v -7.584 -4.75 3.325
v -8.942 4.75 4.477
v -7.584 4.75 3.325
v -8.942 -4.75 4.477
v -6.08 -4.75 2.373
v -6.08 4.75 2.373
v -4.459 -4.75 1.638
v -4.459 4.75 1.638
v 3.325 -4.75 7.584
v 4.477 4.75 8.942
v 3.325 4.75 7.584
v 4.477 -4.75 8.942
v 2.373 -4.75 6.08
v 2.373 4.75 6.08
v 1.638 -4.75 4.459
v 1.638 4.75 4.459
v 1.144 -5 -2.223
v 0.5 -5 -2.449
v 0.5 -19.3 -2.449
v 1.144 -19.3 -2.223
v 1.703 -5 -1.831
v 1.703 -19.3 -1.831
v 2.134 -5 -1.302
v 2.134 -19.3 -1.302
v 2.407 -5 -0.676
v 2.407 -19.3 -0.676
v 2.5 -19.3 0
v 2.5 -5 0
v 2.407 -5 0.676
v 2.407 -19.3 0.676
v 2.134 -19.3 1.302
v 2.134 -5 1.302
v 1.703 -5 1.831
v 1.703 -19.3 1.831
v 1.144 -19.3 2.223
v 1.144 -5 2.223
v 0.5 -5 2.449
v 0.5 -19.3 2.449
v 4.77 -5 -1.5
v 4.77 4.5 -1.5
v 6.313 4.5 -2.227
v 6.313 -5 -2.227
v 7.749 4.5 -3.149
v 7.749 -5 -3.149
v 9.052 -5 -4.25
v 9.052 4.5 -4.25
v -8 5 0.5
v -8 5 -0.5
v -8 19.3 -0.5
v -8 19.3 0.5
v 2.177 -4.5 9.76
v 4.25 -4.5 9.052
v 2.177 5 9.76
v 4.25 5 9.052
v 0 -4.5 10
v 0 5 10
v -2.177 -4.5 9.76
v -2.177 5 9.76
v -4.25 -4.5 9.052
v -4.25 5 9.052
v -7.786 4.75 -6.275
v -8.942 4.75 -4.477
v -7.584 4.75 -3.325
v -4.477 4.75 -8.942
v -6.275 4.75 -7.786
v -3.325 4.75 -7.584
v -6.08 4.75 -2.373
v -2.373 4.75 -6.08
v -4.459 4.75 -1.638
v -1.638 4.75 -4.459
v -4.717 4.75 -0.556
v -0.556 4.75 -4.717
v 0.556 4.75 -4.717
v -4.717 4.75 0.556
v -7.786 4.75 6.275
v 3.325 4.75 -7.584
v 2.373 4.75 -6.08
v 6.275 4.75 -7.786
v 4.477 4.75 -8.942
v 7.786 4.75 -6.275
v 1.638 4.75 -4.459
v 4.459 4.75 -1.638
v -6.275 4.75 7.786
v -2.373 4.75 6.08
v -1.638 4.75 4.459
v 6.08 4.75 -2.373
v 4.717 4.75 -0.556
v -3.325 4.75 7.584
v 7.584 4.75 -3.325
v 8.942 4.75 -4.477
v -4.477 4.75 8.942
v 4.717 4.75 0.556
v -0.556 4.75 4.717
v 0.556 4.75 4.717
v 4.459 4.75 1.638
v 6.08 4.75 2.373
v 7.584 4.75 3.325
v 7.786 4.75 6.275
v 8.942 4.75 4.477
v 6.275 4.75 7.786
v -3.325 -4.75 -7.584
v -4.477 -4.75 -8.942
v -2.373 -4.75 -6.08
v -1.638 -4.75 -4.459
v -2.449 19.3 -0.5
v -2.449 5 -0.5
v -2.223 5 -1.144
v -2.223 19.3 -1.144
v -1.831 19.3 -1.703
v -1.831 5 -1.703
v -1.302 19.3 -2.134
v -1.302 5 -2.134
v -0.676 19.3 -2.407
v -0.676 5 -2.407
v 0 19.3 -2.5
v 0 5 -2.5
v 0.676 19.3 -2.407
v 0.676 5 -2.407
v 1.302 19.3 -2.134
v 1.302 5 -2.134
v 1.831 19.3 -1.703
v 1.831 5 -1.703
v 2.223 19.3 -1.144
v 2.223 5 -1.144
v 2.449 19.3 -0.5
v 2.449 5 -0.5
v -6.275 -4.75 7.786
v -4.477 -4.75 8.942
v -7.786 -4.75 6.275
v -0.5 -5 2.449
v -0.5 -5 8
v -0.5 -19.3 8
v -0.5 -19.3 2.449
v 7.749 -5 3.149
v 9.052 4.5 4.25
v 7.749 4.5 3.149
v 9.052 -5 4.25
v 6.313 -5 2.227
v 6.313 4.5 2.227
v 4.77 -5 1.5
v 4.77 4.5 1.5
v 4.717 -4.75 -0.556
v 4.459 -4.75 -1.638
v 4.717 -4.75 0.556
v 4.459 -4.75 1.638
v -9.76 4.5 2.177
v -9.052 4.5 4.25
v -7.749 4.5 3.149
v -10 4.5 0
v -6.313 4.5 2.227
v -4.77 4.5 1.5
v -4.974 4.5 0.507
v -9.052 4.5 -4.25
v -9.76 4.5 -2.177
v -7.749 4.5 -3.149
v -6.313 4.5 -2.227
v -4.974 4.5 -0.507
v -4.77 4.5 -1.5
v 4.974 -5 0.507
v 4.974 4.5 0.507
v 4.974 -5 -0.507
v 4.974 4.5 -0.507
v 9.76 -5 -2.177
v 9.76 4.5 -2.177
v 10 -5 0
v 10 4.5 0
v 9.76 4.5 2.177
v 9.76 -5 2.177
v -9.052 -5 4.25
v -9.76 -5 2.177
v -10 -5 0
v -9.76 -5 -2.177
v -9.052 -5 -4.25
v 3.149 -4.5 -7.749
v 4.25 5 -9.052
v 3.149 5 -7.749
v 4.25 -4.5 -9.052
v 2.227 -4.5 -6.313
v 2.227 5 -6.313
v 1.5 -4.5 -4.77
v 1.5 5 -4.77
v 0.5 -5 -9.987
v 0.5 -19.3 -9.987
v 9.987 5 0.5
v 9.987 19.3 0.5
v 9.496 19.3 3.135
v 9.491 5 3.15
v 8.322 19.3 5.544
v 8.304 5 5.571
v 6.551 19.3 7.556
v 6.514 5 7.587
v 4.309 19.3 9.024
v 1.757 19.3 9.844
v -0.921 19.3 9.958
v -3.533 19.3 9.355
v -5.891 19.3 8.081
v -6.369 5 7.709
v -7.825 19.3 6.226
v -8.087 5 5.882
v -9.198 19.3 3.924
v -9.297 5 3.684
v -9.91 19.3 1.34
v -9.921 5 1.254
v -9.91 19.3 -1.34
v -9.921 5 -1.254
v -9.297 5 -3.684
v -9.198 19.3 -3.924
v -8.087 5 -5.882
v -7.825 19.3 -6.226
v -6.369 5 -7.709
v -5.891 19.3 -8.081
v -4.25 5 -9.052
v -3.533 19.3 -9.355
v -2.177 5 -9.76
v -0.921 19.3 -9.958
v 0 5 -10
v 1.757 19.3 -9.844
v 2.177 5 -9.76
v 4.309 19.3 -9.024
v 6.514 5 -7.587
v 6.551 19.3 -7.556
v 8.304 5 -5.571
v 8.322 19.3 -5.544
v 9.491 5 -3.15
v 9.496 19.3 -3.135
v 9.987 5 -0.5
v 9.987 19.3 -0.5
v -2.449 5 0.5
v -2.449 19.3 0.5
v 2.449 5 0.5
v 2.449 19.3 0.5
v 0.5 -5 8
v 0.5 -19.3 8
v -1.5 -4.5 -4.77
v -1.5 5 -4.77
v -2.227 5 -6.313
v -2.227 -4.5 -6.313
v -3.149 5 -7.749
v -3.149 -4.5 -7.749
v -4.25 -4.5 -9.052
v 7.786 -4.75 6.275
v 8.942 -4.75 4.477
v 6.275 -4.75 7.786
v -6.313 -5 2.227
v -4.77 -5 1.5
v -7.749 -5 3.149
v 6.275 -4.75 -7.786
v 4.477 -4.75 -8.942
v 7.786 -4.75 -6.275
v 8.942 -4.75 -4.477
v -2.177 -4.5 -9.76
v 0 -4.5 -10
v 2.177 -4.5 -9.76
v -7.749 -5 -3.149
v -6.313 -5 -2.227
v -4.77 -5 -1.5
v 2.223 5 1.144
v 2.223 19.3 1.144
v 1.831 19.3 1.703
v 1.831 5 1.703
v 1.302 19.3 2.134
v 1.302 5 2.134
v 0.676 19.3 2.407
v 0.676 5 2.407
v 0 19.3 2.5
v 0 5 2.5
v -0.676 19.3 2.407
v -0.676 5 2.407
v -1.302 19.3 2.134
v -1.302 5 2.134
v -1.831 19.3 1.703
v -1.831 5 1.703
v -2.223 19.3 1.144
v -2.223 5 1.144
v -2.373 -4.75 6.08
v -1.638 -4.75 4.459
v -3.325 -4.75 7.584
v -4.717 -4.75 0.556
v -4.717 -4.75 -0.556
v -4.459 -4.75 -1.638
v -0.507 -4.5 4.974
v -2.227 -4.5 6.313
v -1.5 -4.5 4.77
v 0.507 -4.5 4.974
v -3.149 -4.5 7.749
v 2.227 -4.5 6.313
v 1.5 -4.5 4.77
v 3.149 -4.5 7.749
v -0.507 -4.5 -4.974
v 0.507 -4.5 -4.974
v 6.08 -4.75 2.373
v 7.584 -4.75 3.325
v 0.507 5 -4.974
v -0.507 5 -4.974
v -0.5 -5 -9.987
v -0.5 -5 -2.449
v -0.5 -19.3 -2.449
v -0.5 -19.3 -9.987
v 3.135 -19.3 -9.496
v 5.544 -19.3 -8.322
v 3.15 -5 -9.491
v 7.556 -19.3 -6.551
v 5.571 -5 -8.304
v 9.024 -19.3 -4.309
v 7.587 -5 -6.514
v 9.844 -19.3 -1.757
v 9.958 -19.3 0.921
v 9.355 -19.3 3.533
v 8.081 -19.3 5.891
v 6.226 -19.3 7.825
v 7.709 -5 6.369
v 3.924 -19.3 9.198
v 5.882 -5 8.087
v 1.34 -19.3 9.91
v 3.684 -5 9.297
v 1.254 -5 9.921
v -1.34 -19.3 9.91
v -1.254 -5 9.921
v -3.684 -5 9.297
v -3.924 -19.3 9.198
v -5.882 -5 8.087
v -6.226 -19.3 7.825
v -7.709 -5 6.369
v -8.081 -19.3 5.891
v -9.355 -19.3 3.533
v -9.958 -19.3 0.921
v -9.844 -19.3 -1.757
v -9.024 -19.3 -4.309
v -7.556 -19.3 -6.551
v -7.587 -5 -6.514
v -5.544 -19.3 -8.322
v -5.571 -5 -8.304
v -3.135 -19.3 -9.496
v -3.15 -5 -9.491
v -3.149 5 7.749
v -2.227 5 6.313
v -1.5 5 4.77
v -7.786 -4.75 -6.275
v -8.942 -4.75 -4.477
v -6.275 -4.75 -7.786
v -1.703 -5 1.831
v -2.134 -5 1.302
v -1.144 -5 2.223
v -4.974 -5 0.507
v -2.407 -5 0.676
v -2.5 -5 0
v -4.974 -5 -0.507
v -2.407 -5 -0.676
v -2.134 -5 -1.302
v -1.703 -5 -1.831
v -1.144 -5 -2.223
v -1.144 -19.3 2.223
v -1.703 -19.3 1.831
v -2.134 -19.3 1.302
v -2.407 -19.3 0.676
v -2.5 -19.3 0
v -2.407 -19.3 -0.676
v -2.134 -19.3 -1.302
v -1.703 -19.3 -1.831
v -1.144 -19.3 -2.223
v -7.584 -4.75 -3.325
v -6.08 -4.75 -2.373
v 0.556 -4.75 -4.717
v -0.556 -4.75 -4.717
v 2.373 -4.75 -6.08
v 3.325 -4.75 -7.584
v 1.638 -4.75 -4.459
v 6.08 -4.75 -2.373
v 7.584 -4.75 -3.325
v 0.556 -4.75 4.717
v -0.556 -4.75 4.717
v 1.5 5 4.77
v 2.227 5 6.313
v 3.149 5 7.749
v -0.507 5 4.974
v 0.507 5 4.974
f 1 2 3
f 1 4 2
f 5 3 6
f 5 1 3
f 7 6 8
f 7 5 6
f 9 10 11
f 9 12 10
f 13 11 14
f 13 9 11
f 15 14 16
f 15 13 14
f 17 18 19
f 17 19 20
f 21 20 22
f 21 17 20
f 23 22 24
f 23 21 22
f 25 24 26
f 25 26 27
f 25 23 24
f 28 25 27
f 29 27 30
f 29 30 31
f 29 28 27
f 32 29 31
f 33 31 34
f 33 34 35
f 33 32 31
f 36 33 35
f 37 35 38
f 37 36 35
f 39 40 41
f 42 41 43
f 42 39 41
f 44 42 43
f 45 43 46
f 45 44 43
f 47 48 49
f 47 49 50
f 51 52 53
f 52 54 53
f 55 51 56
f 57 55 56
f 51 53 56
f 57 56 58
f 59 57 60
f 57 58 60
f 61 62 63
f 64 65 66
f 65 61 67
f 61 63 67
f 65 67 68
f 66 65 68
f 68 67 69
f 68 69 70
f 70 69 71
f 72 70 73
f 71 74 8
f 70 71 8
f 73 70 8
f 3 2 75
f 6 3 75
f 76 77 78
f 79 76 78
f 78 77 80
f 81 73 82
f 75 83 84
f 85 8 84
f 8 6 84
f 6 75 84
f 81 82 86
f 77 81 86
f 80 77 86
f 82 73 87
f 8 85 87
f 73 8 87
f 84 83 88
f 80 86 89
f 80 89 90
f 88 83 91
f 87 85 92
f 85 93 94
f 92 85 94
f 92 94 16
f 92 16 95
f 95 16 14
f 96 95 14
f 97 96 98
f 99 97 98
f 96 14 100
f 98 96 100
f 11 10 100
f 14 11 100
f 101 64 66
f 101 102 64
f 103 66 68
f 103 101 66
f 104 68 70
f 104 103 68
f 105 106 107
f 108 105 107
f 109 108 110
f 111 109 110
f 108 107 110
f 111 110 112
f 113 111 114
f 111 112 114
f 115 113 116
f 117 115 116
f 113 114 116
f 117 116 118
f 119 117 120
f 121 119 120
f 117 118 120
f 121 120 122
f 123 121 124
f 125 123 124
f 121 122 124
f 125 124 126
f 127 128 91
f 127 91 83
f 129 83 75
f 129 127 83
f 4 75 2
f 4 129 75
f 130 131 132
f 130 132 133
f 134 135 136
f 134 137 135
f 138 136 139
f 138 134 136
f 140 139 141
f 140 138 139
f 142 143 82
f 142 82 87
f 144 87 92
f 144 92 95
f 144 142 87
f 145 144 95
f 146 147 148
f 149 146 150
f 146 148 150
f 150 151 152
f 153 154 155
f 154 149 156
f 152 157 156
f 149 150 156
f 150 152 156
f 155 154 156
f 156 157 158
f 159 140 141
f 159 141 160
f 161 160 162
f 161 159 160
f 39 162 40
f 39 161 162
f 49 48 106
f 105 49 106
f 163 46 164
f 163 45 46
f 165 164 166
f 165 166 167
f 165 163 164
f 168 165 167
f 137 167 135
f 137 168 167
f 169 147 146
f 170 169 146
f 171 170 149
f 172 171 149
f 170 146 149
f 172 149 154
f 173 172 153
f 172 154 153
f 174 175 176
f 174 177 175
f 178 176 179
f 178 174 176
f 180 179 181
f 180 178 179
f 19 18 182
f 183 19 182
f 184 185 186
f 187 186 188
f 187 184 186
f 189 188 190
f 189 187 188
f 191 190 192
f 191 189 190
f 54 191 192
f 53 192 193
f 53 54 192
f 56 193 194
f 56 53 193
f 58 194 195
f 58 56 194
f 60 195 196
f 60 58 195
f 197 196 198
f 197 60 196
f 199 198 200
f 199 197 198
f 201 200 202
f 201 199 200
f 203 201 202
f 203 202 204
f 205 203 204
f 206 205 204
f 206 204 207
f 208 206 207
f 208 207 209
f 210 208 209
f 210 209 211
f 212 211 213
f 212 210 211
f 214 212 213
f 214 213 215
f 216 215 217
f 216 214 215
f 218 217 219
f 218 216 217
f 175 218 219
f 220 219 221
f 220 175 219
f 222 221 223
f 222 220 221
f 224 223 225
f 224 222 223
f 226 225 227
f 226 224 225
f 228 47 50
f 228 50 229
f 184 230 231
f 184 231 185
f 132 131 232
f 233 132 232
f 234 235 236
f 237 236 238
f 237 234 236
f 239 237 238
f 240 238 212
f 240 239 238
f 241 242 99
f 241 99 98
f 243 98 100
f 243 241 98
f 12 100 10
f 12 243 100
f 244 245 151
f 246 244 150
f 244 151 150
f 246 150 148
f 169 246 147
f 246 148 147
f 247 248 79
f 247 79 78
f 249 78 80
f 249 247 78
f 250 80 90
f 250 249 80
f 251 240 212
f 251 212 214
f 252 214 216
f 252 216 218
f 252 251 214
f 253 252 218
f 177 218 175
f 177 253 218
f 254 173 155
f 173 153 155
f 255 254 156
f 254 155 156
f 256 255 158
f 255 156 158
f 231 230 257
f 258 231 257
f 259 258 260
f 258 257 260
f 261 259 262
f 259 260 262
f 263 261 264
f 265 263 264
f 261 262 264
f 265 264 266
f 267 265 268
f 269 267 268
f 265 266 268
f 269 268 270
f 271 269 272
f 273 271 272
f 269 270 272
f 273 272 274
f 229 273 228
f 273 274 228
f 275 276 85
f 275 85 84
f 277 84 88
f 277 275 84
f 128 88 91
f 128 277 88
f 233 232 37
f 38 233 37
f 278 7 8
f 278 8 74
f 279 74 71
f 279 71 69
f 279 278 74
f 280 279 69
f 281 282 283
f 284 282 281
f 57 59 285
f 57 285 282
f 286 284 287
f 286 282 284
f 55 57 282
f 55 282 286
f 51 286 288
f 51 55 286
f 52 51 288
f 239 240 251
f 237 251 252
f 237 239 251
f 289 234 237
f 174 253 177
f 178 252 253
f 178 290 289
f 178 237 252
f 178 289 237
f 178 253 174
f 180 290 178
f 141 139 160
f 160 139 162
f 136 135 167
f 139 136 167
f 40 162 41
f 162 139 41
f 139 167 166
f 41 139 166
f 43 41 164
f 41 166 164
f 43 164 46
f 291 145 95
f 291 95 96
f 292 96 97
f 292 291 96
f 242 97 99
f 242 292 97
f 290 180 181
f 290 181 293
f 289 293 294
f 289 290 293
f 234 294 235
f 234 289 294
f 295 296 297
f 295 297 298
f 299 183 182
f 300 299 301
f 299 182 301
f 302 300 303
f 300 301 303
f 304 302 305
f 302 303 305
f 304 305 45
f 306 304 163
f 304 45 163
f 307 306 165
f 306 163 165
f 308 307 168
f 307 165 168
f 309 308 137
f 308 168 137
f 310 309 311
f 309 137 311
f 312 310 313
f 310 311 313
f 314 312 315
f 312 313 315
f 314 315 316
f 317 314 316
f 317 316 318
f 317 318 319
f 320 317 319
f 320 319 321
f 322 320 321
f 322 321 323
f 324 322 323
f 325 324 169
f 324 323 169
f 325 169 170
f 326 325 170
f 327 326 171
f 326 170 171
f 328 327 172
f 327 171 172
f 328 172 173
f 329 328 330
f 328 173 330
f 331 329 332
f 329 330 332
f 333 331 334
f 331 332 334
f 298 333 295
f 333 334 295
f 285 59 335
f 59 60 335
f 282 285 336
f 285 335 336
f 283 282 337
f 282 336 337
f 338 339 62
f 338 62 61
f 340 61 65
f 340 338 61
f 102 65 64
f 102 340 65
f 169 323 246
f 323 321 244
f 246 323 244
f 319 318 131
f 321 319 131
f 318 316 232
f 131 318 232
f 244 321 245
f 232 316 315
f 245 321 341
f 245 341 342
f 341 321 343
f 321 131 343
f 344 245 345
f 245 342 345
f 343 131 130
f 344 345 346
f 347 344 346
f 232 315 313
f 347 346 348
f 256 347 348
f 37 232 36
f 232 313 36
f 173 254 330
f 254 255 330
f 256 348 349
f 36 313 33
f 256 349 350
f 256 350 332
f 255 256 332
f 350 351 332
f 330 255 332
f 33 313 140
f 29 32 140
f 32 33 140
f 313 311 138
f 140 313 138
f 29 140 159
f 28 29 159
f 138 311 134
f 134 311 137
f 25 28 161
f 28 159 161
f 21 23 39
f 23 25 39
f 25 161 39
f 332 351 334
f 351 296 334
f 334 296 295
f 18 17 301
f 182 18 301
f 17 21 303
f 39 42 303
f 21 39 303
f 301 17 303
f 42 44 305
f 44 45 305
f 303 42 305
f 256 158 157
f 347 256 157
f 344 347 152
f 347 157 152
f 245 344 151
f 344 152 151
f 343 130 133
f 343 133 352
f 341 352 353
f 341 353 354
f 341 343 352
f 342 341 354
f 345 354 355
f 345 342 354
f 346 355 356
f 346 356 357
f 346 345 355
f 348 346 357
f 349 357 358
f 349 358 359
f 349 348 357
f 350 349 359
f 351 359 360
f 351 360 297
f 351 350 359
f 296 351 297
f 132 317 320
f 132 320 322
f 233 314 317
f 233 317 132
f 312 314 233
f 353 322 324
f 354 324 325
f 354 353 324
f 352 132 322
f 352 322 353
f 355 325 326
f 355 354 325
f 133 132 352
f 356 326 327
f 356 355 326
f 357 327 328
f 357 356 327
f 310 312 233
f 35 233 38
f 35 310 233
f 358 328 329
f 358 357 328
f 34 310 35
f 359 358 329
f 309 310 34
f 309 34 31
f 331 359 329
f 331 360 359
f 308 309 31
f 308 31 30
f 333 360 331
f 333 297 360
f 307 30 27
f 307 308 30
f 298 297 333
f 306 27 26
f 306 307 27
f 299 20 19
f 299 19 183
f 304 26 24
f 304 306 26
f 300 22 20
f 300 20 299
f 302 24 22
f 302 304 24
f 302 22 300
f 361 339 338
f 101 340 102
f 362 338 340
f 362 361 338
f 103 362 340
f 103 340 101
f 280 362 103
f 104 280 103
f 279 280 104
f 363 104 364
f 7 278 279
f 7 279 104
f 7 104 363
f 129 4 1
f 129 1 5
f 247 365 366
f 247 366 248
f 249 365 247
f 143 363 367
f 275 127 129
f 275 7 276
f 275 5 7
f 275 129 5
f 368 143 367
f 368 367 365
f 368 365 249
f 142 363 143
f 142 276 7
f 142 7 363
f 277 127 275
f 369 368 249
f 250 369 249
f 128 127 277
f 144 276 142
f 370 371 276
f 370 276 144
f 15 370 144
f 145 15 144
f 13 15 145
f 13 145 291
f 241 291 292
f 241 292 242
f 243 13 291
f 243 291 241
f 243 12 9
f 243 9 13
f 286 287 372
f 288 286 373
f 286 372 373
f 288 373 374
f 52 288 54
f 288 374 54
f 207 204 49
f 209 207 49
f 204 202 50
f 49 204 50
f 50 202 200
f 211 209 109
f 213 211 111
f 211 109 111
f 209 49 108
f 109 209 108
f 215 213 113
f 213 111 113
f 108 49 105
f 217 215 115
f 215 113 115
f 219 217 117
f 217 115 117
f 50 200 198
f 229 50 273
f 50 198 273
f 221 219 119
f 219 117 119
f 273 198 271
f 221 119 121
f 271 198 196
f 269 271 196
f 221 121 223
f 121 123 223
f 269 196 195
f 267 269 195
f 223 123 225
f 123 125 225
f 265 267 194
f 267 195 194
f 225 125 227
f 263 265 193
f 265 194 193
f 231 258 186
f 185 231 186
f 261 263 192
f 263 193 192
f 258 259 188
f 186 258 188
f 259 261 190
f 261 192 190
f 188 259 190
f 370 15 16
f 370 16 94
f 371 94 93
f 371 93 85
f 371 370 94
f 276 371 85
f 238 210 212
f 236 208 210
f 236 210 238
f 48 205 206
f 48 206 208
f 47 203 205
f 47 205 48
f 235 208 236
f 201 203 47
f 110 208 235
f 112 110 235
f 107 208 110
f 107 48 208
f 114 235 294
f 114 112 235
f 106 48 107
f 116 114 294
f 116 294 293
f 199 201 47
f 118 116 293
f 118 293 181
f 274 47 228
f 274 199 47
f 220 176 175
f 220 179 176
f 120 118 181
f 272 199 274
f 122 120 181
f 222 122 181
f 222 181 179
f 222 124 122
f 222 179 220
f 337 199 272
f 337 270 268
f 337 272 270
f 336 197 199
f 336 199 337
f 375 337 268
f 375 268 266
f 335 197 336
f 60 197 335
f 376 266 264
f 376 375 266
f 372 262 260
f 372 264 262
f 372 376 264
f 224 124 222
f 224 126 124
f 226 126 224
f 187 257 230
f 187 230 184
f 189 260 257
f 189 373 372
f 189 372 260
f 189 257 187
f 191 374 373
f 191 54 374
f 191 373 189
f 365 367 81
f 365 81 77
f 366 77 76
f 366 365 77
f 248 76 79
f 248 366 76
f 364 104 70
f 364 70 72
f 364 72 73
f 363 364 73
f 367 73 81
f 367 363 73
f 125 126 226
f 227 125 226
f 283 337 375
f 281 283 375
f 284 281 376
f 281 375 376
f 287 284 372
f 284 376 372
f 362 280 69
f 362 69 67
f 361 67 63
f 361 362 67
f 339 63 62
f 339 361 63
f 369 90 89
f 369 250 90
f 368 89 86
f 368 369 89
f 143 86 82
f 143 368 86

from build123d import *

# Parameters (mm, degrees)
F3_DEPTH      = 4.75
F4_COUNT      = 4
F5_START      = -5
F0_R          = 10
F5_DEPTH      = 14.3
F6_W          = 18
F6_H          = 1
F7_DEPTH      = 25
F8_DEPTH      = 5
F8_DEPTH_BACK = 4.5
F9_R          = 2.5
F10_DEPTH     = 19.301
F12_ANGLE     = 90


with BuildPart() as f3:
    # F2 (on Front) → F3 (new body, symmetric)
    with BuildSketch(Plane.XZ):
        with BuildLine():
            ThreePointArc((-4.4586358523, 1.6380068182), (3.3587572106, -3.3587572106), (-1.6380068182, 4.4586358523))
            ThreePointArc((-1.6380068182, 4.4586358523), (-2.8228261992, 6.8488983126), (-4.4773818182, 8.9416470549))
            ThreePointArc((-4.4773818182, 8.9416470549), (-7.0710678119, 7.0710678119), (-8.9416470549, 4.4773818182))
            ThreePointArc((-8.9416470549, 4.4773818182), (-6.8488983126, 2.8228261992), (-4.4586358523, 1.6380068182))
        make_face()
    extrude(amount=F3_DEPTH, both=True)

    # F4: F3 ×4 about axis
    f4_axis = Axis((0, 0, 0), (0, -1, 0))


with BuildPart() as f3_1:
    add(f3.part)
    for i in range(1, F4_COUNT):
        add(f3.part.rotate(f4_axis, i * 360 / F4_COUNT))


with BuildPart() as f5:
    # F0 (on Front) → F5 (new body)
    with BuildSketch(Plane.XZ.offset(F5_START)):
        Circle(F0_R)
    extrude(amount=-F5_DEPTH)

    # F6 (on Front) → F7 (cut)
    with BuildSketch(Plane.XZ):
        with Locations((1, 0)):
            Rectangle(F6_W, F6_H)
    extrude(amount=-F7_DEPTH, mode=Mode.SUBTRACT)

    # F1 (on Front) → F8 (join, two sides)
    with BuildSketch(Plane.XZ) as f8_sk:
        with BuildLine():
            ThreePointArc((1.5, 4.7696960071), (2.6640650262, 7.0462745848), (4.25, 9.0519334951))
            ThreePointArc((4.25, 9.0519334951), (0, 10), (-4.25, 9.0519334951))
            ThreePointArc((-4.25, 9.0519334951), (-2.6640650262, 7.0462745848), (-1.5, 4.7696960071))
            ThreePointArc((-1.5, 4.7696960071), (0, 5), (1.5, 4.7696960071))
        make_face()
        with BuildLine():
            ThreePointArc((-1.5, -4.7696960071), (-2.6640650262, -7.0462745848), (-4.25, -9.0519334951))
            ThreePointArc((-4.25, -9.0519334951), (0, -10), (4.25, -9.0519334951))
            ThreePointArc((4.25, -9.0519334951), (2.6640650262, -7.0462745848), (1.5, -4.7696960071))
            ThreePointArc((1.5, -4.7696960071), (0, -5), (-1.5, -4.7696960071))
        make_face()
    extrude(amount=-F8_DEPTH)
    extrude(f8_sk.sketch, amount=F8_DEPTH_BACK)

    # F9 (on Front) → F10 (cut, through all)
    with BuildSketch(Plane.XZ):
        Circle(F9_R)
    extrude(amount=-F10_DEPTH, mode=Mode.SUBTRACT)


with BuildPart() as f11_1:
    # F11: instance of F5
    add(f5.part.mirror(Plane.XZ))


with BuildPart() as f11_1_1:
    # F12: moved
    add(f11_1.part.rotate(Axis((0, -5, 0), (0, 1, 0)), F12_ANGLE))


solid = Compound([f3_1.part, f5.part, f11_1_1.part])
